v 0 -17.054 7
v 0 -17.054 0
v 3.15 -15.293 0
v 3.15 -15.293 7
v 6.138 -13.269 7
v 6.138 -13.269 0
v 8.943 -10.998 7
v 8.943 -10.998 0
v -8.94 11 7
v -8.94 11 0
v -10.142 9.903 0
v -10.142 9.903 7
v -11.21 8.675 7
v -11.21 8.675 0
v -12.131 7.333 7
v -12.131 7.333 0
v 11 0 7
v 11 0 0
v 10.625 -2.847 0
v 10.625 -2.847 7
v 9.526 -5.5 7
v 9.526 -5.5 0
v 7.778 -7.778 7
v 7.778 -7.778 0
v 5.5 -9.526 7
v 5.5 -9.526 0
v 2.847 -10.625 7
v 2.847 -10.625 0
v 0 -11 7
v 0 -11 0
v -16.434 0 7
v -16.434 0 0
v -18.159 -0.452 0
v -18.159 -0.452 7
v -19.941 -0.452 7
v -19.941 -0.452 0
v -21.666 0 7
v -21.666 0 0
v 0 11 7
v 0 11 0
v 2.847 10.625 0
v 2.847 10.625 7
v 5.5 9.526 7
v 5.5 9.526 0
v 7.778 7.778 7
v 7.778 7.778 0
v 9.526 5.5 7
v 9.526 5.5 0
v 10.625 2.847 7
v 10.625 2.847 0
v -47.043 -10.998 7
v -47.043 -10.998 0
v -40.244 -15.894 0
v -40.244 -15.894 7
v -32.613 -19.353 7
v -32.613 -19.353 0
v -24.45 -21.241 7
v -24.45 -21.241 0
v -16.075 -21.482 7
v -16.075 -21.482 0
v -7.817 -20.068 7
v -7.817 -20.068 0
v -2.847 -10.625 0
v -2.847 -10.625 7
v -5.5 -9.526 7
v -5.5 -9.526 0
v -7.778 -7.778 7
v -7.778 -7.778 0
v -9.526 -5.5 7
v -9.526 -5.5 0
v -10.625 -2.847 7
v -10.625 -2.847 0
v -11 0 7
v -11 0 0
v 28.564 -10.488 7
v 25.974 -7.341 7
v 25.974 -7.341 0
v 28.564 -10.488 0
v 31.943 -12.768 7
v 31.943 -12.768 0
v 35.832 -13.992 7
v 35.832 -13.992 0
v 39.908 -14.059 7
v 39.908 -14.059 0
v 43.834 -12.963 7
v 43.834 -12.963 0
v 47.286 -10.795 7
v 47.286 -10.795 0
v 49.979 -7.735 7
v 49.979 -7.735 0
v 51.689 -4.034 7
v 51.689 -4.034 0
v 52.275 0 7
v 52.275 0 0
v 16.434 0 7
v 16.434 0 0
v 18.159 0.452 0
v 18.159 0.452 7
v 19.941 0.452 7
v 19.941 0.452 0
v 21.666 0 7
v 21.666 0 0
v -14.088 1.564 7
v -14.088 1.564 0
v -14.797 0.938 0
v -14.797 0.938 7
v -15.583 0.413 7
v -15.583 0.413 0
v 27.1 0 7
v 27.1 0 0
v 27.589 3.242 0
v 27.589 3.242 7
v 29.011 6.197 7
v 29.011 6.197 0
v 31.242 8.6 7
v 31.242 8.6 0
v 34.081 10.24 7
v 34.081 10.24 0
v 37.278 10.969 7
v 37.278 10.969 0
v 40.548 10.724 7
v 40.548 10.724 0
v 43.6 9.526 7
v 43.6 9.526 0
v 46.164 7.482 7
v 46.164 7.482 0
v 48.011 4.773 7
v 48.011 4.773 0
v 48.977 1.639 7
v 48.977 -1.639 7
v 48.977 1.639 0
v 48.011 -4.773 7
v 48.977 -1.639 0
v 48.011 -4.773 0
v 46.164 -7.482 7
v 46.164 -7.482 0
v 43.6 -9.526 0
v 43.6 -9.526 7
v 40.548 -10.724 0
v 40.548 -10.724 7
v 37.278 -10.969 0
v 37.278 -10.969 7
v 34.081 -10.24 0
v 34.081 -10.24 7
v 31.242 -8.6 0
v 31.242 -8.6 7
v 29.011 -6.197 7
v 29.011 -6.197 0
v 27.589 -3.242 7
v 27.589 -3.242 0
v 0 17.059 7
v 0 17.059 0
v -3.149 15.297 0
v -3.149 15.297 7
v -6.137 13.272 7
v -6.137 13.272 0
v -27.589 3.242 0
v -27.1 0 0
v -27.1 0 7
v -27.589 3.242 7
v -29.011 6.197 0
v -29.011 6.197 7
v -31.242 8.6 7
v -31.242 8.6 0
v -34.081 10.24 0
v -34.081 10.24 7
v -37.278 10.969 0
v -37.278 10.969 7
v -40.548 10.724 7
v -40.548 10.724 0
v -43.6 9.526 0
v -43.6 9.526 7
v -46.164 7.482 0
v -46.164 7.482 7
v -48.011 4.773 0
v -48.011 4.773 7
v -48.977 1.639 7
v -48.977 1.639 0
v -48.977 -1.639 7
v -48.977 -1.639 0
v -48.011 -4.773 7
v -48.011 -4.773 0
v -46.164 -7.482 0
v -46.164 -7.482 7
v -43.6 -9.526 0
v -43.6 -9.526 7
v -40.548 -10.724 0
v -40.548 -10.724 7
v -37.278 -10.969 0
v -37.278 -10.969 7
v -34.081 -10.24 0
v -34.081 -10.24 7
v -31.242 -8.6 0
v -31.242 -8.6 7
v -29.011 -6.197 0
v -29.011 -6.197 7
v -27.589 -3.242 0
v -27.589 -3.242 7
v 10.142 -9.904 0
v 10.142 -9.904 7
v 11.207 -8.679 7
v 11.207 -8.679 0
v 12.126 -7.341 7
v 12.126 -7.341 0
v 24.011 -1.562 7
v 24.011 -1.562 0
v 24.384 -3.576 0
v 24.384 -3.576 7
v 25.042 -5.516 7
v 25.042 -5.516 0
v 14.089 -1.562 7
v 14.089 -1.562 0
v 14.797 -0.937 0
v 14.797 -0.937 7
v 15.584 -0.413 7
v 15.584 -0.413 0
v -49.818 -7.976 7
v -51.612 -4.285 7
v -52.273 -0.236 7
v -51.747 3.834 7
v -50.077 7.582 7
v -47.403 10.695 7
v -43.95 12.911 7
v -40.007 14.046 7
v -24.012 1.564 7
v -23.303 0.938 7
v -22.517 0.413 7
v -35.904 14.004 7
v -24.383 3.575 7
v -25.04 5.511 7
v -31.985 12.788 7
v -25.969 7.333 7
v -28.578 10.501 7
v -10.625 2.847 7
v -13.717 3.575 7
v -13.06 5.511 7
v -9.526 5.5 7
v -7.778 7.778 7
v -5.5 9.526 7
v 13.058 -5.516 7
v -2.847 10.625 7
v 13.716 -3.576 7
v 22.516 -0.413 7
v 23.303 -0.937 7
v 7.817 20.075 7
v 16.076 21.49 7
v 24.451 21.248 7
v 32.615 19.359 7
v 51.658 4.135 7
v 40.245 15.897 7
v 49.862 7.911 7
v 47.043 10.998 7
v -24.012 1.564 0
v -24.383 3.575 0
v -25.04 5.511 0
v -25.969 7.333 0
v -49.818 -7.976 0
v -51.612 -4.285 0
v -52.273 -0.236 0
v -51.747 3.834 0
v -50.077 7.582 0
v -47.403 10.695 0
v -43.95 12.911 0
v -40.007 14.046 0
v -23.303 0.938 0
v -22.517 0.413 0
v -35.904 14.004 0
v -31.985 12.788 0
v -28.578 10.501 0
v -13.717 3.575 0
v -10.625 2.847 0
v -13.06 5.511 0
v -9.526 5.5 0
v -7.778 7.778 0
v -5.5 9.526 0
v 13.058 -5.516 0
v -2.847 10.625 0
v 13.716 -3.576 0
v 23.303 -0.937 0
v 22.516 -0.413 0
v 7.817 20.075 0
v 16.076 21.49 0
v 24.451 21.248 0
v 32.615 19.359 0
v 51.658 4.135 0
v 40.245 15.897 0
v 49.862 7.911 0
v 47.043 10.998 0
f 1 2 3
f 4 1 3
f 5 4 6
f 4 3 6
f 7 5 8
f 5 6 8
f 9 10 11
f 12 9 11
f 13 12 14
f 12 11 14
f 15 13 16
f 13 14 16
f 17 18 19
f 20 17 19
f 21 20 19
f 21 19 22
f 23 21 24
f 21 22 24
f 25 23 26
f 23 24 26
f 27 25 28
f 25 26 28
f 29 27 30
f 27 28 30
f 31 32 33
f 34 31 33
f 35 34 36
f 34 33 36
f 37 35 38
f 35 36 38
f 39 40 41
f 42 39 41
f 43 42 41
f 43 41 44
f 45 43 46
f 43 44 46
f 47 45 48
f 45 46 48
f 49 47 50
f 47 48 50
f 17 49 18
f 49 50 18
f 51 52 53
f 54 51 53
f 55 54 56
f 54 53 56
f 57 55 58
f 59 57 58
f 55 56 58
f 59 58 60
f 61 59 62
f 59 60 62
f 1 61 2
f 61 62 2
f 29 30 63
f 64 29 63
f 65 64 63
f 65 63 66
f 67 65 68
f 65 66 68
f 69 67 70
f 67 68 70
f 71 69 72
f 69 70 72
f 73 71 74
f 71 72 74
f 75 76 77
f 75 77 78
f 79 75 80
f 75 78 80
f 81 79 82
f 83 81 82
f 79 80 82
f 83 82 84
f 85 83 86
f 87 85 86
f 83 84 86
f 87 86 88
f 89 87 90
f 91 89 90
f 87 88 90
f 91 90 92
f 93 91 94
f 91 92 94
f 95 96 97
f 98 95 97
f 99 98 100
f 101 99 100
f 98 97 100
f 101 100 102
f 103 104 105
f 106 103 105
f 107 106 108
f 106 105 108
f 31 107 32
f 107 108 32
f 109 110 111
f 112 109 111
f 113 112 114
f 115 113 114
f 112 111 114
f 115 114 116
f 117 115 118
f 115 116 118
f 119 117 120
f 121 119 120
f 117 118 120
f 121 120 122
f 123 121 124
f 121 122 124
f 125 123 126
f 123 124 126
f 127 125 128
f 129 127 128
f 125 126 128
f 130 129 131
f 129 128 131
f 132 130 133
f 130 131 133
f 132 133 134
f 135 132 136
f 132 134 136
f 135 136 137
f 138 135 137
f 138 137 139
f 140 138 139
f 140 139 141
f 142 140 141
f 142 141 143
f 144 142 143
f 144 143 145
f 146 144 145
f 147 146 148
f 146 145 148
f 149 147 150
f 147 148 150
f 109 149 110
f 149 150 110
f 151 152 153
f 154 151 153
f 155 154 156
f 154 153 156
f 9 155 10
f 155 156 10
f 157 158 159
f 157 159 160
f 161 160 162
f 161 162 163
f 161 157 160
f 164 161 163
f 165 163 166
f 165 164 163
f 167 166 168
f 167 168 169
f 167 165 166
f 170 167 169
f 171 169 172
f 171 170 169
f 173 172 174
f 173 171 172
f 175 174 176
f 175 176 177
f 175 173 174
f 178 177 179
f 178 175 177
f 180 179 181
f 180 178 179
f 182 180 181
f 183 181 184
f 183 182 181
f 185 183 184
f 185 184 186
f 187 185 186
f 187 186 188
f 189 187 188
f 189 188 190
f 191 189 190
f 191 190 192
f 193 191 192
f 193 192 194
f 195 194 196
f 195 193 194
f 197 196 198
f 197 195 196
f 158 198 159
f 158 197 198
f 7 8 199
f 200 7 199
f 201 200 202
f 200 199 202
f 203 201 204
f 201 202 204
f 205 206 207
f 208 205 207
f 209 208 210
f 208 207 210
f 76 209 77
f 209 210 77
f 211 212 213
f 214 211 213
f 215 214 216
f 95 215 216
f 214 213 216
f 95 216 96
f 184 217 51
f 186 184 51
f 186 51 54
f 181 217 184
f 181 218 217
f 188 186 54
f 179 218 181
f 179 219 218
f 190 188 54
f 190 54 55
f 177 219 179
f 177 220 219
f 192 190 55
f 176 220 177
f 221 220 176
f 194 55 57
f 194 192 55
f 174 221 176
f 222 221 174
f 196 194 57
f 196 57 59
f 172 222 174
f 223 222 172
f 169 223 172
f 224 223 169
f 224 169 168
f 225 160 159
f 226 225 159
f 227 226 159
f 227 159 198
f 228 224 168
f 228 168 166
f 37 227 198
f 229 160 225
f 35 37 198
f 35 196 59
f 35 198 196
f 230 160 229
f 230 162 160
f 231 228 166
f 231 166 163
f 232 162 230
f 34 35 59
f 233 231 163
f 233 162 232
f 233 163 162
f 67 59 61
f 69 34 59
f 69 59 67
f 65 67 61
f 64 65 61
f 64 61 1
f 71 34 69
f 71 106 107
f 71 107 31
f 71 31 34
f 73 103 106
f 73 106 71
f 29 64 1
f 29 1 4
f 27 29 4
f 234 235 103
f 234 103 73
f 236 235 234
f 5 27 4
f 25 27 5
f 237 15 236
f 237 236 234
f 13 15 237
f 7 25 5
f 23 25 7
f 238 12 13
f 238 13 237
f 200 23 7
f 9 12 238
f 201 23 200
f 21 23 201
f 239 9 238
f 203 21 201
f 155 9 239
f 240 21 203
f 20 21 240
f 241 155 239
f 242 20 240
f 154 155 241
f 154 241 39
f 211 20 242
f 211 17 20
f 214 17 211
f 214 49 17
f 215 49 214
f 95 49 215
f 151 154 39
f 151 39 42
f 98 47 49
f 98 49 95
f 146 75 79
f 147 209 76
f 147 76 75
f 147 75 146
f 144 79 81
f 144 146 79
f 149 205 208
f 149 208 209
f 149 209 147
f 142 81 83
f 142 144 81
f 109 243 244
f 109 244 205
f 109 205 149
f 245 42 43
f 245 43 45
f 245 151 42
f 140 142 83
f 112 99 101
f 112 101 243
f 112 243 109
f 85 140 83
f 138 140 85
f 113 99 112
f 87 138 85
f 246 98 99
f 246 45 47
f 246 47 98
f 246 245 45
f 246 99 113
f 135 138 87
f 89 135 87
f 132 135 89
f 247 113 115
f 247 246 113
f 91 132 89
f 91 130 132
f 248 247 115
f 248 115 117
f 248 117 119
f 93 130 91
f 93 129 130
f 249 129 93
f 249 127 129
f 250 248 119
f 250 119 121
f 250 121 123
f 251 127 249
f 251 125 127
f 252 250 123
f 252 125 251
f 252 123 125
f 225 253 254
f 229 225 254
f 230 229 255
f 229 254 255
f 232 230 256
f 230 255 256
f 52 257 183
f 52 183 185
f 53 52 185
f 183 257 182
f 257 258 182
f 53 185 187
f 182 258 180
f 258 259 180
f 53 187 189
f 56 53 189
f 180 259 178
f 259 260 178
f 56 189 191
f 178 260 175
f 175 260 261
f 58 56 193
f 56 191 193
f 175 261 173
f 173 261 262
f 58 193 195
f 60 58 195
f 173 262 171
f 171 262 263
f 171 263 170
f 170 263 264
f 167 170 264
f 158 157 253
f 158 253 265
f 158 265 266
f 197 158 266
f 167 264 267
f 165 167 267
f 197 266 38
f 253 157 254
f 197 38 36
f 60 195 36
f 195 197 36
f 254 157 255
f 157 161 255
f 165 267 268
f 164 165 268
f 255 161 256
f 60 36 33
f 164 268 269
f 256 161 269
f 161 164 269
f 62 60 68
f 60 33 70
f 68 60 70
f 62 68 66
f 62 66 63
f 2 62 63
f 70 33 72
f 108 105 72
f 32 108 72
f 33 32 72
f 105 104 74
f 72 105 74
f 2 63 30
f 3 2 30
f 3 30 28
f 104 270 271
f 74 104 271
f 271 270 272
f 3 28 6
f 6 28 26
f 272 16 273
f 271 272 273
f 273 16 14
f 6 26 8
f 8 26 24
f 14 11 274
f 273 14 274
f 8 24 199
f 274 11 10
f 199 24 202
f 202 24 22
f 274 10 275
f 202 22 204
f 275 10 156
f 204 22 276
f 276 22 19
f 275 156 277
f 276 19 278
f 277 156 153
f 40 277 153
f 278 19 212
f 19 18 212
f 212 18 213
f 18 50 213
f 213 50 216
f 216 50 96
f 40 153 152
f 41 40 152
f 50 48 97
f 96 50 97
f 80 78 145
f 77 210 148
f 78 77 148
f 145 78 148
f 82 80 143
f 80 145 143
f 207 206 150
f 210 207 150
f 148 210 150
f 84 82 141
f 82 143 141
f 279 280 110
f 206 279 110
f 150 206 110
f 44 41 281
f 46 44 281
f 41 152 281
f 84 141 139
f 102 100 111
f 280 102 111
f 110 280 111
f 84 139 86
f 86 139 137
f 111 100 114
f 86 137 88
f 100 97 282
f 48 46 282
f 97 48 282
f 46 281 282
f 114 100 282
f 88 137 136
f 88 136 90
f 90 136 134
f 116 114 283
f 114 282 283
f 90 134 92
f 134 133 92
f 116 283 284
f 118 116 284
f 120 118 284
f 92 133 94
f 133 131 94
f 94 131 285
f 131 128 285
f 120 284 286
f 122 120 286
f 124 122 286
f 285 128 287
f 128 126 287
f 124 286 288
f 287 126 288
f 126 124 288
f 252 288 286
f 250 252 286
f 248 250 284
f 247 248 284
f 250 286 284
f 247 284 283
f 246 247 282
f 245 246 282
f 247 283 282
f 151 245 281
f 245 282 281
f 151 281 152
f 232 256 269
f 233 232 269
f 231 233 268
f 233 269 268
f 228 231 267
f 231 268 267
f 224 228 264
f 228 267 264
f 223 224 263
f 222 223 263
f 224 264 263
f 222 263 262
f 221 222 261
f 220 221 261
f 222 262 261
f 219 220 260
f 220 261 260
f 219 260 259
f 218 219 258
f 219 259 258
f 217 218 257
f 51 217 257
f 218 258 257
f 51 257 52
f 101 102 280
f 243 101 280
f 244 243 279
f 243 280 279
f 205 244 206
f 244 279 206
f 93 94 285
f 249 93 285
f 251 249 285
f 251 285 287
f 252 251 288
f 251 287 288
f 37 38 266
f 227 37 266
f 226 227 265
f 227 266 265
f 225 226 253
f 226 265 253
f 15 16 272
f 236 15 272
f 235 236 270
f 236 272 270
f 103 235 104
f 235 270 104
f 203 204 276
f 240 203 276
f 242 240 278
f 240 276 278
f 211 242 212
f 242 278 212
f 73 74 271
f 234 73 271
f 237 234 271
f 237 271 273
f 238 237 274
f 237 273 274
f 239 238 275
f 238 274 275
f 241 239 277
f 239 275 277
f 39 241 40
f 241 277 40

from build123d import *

# Parameters (mm, degrees)
F0_R     = 11
F1_DEPTH = 7


# Not quite as in the source:
# - a feature names something its author has since deleted; it is built from what else it names


with BuildPart() as f1:
    # F0 (on Top) → F1 (new body)
    with BuildSketch(Plane.XY):
        with BuildLine():
            Line((14.175, 0), (11, 0))
            ThreePointArc((11, 0), (7.7781745931, -7.7781745931), (0, -11))
            Line((0, -11), (0, -14.175))
            ThreePointArc((0, -14.175), (4.7450574285, -13.3572098509), (8.9426071008, -10.9982))
            ThreePointArc((8.9426071008, -10.9982), (10.6919977036, -9.3065466262), (12.1262614453, -7.3406))
            ThreePointArc((12.1262614453, -7.3406), (12.4422930723, -4.2253938225), (14.0886784217, -1.561974817))
            ThreePointArc((14.0886784217, -1.561974817), (14.1534031531, -0.7821791265), (14.175, 0))
        make_face()
        with BuildLine():
            ThreePointArc((0, 11), (7.7781745931, 7.7781745931), (11, 0))
            Line((11, 0), (14.175, 0))
            ThreePointArc((14.175, 0), (10.0232386233, 10.0232386233), (0, 14.175))
            Line((0, 14.175), (0, 11))
        make_face()
        with BuildLine():
            ThreePointArc((-11, 0), (-7.7781745931, 7.7781745931), (0, 11))
            Line((0, 11), (0, 14.175))
            ThreePointArc((0, 14.175), (-4.7437129445, 13.3576873934), (-8.9403928885, 11))
            ThreePointArc((-8.9403928885, 11), (-10.6938487189, 9.304419626), (-12.1306573285, 7.3333333333))
            ThreePointArc((-12.1306573285, 7.3333333333), (-12.4461611466, 4.2234349909), (-14.0884789594, 1.5637728768))
            ThreePointArc((-14.0884789594, 1.5637728768), (-14.1533532113, 0.7830822914), (-14.175, 0))
            Line((-14.175, 0), (-11, 0))
        make_face()
        with BuildLine():
            Line((0, -14.175), (0, -11))
            ThreePointArc((0, -11), (-7.7781745931, -7.7781745931), (-11, 0))
            Line((-11, 0), (-14.175, 0))
            ThreePointArc((-14.175, 0), (-10.0232386233, -10.0232386233), (0, -14.175))
        make_face()
        with BuildLine():
            ThreePointArc((0, 14.175), (10.0232386233, 10.0232386233), (14.175, 0))
            Line((14.175, 0), (16.4338, 0))
            ThreePointArc((16.4338, 0), (19.05, 0.5089718042), (21.6662, 0))
            Line((21.6662, 0), (23.925, 0))
            ThreePointArc((23.925, 0), (32.0102886216, 12.8002359481), (47.0426071008, 10.9982))
            ThreePointArc((47.0426071008, 10.9982), (24.4514597735, 21.2483327836), (0, 17.0589086472))
            Line((0, 17.0589086472), (0, 14.175))
        make_face()
        with BuildLine():
            Line((16.4338, 0), (14.175, 0))
            ThreePointArc((14.175, 0), (14.1534031531, -0.7821791265), (14.0886784217, -1.561974817))
            ThreePointArc((14.0886784217, -1.561974817), (15.1815830564, -0.6613930561), (16.4338, 0))
        make_face()
        with BuildLine():
            ThreePointArc((-8.9403928885, 11), (-4.7437129445, 13.3576873934), (0, 14.175))
            Line((0, 14.175), (0, 17.0589086472))
            ThreePointArc((0, 17.0589086472), (-4.6644934549, 14.3161547368), (-8.9403928885, 11))
        make_face()
        with BuildLine():
            Line((0, -17.0538866478), (0, -14.175))
            ThreePointArc((0, -14.175), (-10.0232386233, -10.0232386233), (-14.175, 0))
            Line((-14.175, 0), (-16.4338, 0))
            ThreePointArc((-16.4338, 0), (-19.05, -0.5093373751), (-21.6662, 0))
            Line((-21.6662, 0), (-23.925, 0))
            ThreePointArc((-23.925, 0), (-32.0102886216, -12.8002359481), (-47.0426071008, -10.9982))
            ThreePointArc((-47.0426071008, -10.9982), (-24.4500361697, -21.2407501362), (0, -17.0538866478))
        make_face()
        with BuildLine():
            ThreePointArc((8.9426071008, -10.9982), (4.7450574285, -13.3572098509), (0, -14.175))
            Line((0, -14.175), (0, -17.0538866478))
            ThreePointArc((0, -17.0538866478), (4.6653864802, -14.3126511831), (8.9426071008, -10.9982))
        make_face()
        with BuildLine():
            ThreePointArc((12.1262614453, -7.3406), (13.4221419792, -4.55814981), (14.0886784217, -1.561974817))
            ThreePointArc((14.0886784217, -1.561974817), (12.4422930723, -4.2253938225), (12.1262614453, -7.3406))
        make_face()
        with BuildLine():
            Line((-16.4338, 0), (-14.175, 0))
            ThreePointArc((-14.175, 0), (-14.1533532113, 0.7830822914), (-14.0884789594, 1.5637728768))
            ThreePointArc((-14.0884789594, 1.5637728768), (-15.1813037797, 0.6621501584), (-16.4338, 0))
        make_face()
        with BuildLine():
            Line((23.925, 0), (21.6662, 0))
            ThreePointArc((21.6662, 0), (22.9184169436, -0.6613930561), (24.0113215783, -1.561974817))
            ThreePointArc((24.0113215783, -1.561974817), (23.9465968469, -0.7821791265), (23.925, 0))
        make_face()
        with BuildLine():
            ThreePointArc((-12.1306573285, 7.3333333333), (-13.4232162274, 4.5549853033), (-14.0884789594, 1.5637728768))
            ThreePointArc((-14.0884789594, 1.5637728768), (-12.4461611466, 4.2234349909), (-12.1306573285, 7.3333333333))
        make_face()
        with BuildLine():
            ThreePointArc((52.275, 0), (50.9002359481, 6.0897113784), (47.0426071008, 10.9982))
            ThreePointArc((47.0426071008, 10.9982), (32.0102886216, 12.8002359481), (23.925, 0))
            ThreePointArc((23.925, 0), (23.9465968469, -0.7821791265), (24.0113215783, -1.561974817))
            ThreePointArc((24.0113215783, -1.561974817), (25.6577069277, -4.2253938225), (25.9737385547, -7.3406))
            ThreePointArc((25.9737385547, -7.3406), (41.9105687904, -13.6532117281), (52.275, 0))
        make_face()
        with BuildLine():
            ThreePointArc((49.1, 0), (38.1, -11), (27.1, 0))
            ThreePointArc((27.1, 0), (38.1, 11), (49.1, 0))
        make_face(mode=Mode.SUBTRACT)
        with BuildLine():
            ThreePointArc((-25.9693426715, 7.3333333333), (-47.4033431975, 10.6947851941), (-47.0426071008, -10.9982))
            ThreePointArc((-47.0426071008, -10.9982), (-32.0102886216, -12.8002359481), (-23.925, 0))
            ThreePointArc((-23.925, 0), (-23.9466467887, 0.7830822914), (-24.0115210406, 1.5637728768))
            ThreePointArc((-24.0115210406, 1.5637728768), (-25.6538388534, 4.2234349909), (-25.9693426715, 7.3333333333))
        make_face()
        with Locations((-38.1, 0)):
            Circle(F0_R, mode=Mode.SUBTRACT)
        with BuildLine():
            ThreePointArc((25.9737385547, -7.3406), (25.6577069277, -4.2253938225), (24.0113215783, -1.561974817))
            ThreePointArc((24.0113215783, -1.561974817), (24.6778580208, -4.55814981), (25.9737385547, -7.3406))
        make_face()
        with BuildLine():
            Line((-23.925, 0), (-21.6662, 0))
            ThreePointArc((-21.6662, 0), (-22.9186962203, 0.6621501584), (-24.0115210406, 1.5637728768))
            ThreePointArc((-24.0115210406, 1.5637728768), (-23.9466467887, 0.7830822914), (-23.925, 0))
        make_face()
        with BuildLine():
            ThreePointArc((-24.0115210406, 1.5637728768), (-24.6767837726, 4.5549853033), (-25.9693426715, 7.3333333333))
            ThreePointArc((-25.9693426715, 7.3333333333), (-25.6538388534, 4.2234349909), (-24.0115210406, 1.5637728768))
        make_face()
    extrude(amount=F1_DEPTH)


solid = f1.part
